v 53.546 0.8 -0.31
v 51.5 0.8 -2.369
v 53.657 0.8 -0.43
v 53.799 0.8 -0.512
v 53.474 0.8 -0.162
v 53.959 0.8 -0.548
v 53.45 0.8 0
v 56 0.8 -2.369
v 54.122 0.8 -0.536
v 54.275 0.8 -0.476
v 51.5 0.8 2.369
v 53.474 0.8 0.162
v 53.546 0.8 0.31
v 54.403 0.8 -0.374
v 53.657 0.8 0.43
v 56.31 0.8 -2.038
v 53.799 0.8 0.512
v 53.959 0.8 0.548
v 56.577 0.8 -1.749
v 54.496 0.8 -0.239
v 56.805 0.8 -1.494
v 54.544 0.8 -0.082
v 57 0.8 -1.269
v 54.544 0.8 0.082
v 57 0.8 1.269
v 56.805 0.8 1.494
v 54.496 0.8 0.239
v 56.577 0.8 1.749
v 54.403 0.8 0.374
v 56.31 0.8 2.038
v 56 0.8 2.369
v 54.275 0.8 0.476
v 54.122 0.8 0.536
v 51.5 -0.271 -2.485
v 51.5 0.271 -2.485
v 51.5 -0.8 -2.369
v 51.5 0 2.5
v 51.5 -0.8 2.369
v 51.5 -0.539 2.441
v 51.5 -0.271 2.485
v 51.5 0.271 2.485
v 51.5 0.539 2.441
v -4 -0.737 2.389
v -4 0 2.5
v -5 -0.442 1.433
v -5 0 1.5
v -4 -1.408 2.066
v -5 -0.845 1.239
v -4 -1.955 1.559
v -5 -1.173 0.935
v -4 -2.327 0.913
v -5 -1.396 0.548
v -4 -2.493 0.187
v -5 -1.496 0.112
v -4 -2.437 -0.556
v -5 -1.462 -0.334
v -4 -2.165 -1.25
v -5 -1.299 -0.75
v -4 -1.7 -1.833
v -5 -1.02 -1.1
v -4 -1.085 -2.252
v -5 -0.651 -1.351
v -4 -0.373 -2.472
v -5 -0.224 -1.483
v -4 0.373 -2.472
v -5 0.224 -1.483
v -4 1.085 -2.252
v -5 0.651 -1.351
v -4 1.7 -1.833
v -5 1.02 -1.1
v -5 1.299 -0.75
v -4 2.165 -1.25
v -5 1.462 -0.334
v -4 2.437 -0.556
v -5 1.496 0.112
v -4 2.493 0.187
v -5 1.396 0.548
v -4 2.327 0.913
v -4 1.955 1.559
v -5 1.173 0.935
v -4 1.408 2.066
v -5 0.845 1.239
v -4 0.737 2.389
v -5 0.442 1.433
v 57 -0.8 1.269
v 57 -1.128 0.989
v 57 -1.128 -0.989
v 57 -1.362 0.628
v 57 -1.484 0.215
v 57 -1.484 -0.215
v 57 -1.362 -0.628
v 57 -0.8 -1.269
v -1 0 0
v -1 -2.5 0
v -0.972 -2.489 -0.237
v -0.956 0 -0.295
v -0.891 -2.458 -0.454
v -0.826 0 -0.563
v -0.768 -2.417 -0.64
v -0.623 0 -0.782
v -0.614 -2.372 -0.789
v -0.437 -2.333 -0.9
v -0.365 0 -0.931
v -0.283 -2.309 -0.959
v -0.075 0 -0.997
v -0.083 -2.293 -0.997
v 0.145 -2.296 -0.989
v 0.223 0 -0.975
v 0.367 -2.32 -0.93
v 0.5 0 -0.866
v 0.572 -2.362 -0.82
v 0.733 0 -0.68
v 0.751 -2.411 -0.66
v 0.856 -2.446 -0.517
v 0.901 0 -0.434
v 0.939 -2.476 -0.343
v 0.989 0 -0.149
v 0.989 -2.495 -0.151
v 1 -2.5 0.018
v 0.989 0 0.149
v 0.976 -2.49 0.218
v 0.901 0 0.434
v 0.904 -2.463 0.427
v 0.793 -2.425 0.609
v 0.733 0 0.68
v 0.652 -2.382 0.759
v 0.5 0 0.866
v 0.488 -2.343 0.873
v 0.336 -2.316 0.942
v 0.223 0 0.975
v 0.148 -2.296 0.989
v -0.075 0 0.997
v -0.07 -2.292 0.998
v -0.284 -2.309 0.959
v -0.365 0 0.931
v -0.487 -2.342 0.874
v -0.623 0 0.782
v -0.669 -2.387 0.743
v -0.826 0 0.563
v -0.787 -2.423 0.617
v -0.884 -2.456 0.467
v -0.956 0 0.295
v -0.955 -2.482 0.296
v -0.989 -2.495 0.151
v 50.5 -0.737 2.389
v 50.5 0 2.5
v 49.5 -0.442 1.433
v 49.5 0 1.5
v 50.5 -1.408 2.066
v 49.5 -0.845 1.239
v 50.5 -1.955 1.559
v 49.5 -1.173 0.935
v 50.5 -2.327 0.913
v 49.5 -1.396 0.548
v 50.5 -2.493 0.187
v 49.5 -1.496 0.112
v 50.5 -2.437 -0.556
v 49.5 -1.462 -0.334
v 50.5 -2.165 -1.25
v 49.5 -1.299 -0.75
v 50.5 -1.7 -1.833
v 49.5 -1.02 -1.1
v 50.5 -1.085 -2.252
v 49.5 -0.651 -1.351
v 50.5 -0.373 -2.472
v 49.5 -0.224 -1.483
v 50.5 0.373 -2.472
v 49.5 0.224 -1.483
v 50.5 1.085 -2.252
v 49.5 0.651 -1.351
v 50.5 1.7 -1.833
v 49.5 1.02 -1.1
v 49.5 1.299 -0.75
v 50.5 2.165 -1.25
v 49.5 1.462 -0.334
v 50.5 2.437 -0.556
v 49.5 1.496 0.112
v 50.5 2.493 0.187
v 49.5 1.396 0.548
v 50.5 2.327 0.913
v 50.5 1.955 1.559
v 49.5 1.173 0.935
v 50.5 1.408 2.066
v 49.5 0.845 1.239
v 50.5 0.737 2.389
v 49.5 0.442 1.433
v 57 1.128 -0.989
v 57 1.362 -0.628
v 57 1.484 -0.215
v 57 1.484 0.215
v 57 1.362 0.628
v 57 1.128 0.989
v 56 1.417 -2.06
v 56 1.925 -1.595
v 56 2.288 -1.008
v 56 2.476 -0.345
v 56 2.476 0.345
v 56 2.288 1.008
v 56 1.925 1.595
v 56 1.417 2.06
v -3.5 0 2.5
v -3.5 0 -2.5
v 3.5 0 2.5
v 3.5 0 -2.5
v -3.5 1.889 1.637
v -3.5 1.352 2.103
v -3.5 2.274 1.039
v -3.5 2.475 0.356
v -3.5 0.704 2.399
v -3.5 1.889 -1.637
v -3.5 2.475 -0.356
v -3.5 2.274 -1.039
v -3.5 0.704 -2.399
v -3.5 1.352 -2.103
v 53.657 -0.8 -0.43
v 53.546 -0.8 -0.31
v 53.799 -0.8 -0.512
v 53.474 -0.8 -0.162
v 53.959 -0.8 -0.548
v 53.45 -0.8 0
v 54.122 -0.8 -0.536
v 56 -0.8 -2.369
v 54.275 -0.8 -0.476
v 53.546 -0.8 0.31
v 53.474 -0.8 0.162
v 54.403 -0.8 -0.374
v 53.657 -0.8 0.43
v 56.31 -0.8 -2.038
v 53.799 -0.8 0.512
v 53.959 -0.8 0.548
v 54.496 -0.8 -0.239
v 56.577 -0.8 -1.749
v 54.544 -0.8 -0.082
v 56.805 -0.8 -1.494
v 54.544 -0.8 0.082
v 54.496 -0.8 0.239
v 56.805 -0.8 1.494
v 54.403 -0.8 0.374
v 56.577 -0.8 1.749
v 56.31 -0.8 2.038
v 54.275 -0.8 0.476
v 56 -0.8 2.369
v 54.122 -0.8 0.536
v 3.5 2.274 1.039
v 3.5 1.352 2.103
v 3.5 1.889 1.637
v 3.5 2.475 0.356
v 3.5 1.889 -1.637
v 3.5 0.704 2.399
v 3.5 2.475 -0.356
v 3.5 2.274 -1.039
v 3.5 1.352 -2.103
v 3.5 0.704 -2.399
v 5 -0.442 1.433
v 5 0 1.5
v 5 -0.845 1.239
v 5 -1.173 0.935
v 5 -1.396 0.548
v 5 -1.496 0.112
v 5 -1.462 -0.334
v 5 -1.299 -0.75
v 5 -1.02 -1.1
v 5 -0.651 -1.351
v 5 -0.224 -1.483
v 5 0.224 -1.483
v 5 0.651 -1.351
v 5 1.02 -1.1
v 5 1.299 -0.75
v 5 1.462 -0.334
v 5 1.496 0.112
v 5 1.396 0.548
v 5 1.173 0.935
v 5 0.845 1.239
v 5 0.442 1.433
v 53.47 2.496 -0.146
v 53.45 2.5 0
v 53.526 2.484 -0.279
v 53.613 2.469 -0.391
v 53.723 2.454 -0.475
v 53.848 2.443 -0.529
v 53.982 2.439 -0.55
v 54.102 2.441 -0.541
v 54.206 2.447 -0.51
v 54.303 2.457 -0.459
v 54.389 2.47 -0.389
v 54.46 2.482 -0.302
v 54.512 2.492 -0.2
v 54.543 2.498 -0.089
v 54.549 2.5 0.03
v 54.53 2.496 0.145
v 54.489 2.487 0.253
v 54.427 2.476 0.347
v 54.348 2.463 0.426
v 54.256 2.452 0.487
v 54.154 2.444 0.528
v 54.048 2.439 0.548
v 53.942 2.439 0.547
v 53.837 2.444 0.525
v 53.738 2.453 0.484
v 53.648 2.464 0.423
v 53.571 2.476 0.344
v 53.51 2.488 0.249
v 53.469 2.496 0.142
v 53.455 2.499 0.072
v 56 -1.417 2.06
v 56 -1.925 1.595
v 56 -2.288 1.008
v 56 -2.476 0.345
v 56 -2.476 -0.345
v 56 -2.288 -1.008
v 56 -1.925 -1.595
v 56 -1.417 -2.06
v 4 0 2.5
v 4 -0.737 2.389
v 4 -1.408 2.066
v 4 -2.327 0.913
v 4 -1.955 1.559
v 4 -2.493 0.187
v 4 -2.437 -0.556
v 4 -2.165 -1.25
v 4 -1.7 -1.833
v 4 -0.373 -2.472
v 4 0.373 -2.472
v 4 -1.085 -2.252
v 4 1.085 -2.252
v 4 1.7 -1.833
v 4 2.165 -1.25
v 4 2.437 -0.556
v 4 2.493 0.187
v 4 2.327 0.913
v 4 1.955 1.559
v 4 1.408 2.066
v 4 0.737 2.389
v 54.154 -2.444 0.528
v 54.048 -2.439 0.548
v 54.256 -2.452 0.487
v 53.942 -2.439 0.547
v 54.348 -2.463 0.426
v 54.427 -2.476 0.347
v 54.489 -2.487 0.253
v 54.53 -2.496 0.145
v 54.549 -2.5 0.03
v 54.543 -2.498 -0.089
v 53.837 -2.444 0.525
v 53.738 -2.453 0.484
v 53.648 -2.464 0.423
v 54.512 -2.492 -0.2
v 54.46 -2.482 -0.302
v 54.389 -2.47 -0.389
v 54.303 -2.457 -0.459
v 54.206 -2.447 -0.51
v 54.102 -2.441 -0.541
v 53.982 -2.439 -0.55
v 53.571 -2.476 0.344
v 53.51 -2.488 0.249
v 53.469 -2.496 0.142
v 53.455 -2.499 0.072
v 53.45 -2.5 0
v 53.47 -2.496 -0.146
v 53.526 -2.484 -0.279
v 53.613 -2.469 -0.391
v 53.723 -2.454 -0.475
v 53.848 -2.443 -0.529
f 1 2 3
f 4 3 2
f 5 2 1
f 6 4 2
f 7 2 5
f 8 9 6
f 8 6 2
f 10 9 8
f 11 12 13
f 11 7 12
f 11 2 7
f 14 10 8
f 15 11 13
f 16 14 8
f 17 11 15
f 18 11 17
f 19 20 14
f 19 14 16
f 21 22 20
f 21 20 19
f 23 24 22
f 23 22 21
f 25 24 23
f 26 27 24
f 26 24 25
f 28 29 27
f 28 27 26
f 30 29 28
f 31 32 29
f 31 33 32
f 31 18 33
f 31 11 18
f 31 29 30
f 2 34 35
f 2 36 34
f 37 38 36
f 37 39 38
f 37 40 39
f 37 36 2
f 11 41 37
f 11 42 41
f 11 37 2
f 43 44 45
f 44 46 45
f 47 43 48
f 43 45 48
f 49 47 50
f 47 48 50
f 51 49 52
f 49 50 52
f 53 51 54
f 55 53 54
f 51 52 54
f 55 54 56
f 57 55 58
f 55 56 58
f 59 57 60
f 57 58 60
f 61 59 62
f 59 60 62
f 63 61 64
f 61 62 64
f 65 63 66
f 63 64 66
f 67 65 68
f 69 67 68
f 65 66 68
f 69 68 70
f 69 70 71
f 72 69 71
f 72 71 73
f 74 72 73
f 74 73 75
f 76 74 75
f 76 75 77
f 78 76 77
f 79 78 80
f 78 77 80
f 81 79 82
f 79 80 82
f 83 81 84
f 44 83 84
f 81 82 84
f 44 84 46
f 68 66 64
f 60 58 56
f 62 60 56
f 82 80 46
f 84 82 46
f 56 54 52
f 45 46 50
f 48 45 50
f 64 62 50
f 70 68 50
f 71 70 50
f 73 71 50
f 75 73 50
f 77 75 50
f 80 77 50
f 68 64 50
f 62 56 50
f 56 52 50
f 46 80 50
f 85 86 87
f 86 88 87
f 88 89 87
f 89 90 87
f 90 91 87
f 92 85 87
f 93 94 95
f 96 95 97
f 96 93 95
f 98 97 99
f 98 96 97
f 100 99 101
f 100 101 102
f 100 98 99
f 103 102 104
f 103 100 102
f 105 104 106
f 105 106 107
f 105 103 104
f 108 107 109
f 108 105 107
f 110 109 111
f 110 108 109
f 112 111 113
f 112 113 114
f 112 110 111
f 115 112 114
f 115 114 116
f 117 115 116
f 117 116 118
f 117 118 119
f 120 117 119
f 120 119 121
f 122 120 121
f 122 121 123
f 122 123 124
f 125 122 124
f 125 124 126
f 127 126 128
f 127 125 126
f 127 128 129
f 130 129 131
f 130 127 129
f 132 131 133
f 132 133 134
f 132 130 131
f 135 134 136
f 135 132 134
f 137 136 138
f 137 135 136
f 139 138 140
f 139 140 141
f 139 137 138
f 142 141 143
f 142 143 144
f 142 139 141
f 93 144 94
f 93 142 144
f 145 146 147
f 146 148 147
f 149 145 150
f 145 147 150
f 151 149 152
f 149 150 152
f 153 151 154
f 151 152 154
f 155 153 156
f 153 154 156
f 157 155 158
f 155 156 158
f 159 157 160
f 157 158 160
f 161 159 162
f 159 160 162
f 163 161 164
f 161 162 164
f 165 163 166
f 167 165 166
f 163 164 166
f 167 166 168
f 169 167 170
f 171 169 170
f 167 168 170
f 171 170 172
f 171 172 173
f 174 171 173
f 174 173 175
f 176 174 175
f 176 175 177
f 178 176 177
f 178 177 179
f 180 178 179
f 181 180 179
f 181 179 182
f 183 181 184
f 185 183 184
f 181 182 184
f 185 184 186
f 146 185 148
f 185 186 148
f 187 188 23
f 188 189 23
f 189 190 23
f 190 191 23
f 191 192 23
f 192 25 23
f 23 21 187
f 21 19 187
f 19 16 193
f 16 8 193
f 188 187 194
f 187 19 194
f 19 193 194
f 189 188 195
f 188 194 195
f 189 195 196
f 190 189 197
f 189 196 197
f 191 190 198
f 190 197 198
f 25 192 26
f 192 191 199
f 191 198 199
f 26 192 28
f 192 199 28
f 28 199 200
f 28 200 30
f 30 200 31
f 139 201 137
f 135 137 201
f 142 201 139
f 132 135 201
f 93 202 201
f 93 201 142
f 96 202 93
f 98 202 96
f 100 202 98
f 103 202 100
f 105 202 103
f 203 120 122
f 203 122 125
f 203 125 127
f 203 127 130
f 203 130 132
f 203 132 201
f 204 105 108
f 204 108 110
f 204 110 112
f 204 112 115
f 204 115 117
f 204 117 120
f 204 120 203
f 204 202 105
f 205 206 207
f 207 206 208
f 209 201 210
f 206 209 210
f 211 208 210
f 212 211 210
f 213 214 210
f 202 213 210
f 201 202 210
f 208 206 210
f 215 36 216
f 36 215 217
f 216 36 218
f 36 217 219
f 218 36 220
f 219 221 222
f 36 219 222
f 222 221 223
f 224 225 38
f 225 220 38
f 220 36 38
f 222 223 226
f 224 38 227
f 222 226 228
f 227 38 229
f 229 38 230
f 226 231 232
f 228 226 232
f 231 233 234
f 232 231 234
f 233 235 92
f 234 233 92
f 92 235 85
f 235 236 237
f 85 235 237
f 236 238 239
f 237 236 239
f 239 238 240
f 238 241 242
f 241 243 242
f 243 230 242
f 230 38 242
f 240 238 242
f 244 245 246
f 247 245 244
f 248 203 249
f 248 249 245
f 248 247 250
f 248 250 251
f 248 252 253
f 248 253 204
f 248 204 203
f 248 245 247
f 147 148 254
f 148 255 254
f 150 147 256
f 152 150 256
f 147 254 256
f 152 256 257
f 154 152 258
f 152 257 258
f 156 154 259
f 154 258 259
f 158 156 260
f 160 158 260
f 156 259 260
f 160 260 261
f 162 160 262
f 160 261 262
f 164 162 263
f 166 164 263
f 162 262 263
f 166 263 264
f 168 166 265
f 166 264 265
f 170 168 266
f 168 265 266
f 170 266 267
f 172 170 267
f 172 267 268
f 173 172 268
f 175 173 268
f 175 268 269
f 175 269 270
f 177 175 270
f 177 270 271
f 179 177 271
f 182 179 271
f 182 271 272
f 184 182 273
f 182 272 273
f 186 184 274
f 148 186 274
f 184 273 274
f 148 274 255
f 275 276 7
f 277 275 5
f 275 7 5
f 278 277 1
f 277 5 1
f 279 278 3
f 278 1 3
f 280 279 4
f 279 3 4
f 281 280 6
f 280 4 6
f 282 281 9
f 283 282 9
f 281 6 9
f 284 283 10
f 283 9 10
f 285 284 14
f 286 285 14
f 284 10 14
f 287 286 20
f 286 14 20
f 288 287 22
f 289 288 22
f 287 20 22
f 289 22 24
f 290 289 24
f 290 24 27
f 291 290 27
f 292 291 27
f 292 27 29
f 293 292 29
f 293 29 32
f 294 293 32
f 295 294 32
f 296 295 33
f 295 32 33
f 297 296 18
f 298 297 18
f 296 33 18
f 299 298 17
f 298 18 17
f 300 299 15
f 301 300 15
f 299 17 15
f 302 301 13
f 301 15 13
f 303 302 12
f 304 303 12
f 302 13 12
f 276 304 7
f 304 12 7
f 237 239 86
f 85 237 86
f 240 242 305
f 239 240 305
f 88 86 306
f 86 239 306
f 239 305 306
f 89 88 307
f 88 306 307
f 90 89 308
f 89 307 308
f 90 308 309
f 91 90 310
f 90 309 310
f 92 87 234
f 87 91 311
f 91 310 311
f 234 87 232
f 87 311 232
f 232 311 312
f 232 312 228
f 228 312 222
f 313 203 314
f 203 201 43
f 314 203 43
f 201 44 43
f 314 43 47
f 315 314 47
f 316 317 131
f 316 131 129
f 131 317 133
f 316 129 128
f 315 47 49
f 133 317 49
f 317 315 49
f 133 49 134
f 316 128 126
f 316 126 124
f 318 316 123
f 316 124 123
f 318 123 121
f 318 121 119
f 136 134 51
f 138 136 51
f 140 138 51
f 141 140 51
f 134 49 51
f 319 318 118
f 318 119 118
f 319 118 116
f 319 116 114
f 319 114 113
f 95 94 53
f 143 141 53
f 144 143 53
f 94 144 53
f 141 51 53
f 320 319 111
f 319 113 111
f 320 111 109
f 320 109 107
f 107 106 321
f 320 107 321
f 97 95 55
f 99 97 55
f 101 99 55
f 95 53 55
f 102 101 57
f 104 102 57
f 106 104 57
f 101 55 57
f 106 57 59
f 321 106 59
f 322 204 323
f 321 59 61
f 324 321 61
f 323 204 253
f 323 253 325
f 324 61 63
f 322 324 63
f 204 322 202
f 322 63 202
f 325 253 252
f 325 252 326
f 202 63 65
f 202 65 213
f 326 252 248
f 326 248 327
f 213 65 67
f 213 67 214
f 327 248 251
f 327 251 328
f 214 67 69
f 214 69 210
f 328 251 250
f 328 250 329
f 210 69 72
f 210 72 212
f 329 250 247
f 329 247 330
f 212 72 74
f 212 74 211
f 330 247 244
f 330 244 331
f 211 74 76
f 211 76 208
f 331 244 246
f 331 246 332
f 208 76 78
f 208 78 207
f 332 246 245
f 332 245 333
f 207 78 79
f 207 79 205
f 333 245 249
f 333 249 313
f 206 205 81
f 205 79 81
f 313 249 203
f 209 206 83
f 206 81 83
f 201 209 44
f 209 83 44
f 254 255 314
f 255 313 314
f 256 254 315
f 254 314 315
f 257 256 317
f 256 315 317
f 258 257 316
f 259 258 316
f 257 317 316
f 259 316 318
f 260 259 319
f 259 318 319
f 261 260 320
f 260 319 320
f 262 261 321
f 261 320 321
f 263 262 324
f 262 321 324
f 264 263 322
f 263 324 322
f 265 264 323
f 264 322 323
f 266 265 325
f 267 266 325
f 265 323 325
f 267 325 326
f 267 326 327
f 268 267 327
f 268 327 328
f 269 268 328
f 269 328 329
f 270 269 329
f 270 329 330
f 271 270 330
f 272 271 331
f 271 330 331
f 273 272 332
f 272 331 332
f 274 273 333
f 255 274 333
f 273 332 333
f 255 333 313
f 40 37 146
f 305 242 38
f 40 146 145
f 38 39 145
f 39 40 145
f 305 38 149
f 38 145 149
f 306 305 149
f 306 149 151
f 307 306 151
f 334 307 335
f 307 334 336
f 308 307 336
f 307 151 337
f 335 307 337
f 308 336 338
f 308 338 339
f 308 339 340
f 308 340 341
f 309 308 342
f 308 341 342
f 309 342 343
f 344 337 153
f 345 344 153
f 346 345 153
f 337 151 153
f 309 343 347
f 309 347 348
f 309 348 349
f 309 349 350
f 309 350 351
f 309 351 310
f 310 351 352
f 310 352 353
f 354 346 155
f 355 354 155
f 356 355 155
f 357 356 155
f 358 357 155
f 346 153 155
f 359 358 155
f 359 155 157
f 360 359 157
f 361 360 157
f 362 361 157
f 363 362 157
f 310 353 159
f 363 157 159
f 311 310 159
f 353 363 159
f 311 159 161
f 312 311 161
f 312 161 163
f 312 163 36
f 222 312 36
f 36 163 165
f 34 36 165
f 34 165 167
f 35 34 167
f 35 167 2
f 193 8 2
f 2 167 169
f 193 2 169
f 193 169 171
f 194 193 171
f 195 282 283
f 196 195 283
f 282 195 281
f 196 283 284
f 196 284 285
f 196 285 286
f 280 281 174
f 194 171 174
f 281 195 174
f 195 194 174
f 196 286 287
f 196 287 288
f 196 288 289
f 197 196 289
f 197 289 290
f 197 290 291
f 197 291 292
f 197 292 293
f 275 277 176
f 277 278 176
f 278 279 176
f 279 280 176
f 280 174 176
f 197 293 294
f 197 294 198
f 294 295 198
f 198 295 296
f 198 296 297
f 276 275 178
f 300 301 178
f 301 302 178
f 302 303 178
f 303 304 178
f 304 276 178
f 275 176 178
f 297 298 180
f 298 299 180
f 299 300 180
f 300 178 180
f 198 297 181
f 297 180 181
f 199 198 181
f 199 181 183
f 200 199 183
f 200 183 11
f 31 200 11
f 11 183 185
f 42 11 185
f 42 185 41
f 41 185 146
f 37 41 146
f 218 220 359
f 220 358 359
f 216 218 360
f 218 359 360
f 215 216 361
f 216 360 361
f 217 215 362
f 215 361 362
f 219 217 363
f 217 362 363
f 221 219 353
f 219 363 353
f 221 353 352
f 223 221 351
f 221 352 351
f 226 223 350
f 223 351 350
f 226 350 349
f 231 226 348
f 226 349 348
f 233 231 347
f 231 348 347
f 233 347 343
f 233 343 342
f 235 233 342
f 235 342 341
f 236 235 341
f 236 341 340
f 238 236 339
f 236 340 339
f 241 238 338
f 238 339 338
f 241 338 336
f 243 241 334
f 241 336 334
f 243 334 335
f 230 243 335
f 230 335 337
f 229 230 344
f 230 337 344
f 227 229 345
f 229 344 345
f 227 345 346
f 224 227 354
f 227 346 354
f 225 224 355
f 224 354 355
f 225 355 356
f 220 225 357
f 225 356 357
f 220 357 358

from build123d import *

# Parameters (mm, degrees)
F2_DEPTH = 12.7
F3_W     = 7
F3_H     = 4.492721
F3_W_2   = 5.5
F3_H_2   = 1.6
F4_DEPTH = 12.7


with BuildPart() as f1:
    # F0 (on Front) → F1 (revolve)
    with BuildSketch(Plane.XZ):
        with BuildLine():
            ThreePointArc((-1, 0), (0, 1), (1, 0))
            Line((1, 0), (53.45, 0))
            ThreePointArc((53.45, 0), (54, 0.55), (54.55, 0))
            Line((54.55, 0), (57, 0))
            Line((57, 0), (57, 1.5))
            Line((57, 1.5), (56, 2.5))
            Line((56, 2.5), (50.5, 2.5))
            Line((50.5, 2.5), (49.5, 1.5))
            Line((49.5, 1.5), (5, 1.5))
            Line((5, 1.5), (4, 2.5))
            Line((4, 2.5), (-4, 2.5))
            Line((-4, 2.5), (-5, 1.5))
            Line((-5, 1.5), (-5, 0))
            Line((-5, 0), (-1, 0))
        make_face()
        with BuildLine():
            ThreePointArc((-1, 0), (0, -1), (1, 0))
            Line((1, 0), (-1, 0))
        make_face()
        with BuildLine():
            Line((54.55, 0), (53.45, 0))
            ThreePointArc((53.45, 0), (54, -0.55), (54.55, 0))
        make_face()
    revolve(axis=Axis((26, 0, 0), (1, 0, 0)))

    # F0 (on Front) → F2 (cut, symmetric)
    with BuildSketch(Plane.XZ):
        with BuildLine():
            Line((-1, 0), (1, 0))
            ThreePointArc((1, 0), (0, 1), (-1, 0))
        make_face()
        with BuildLine():
            ThreePointArc((-1, 0), (0, -1), (1, 0))
            Line((1, 0), (-1, 0))
        make_face()
        with BuildLine():
            ThreePointArc((54.55, 0), (54, 0.55), (53.45, 0))
            Line((53.45, 0), (54.55, 0))
        make_face()
        with BuildLine():
            Line((54.55, 0), (53.45, 0))
            ThreePointArc((53.45, 0), (54, -0.55), (54.55, 0))
        make_face()
    extrude(amount=F2_DEPTH, both=True, mode=Mode.SUBTRACT)

    # F3 (on Top) → F4 (cut, symmetric)
    with BuildSketch(Plane.XY):
        with Locations((0, 2.24636)):
            Rectangle(F3_W, F3_H)
        with Locations((54.25, 0)):
            Rectangle(F3_W_2, F3_H_2)
    extrude(amount=F4_DEPTH, both=True, mode=Mode.SUBTRACT)


solid = f1.part
